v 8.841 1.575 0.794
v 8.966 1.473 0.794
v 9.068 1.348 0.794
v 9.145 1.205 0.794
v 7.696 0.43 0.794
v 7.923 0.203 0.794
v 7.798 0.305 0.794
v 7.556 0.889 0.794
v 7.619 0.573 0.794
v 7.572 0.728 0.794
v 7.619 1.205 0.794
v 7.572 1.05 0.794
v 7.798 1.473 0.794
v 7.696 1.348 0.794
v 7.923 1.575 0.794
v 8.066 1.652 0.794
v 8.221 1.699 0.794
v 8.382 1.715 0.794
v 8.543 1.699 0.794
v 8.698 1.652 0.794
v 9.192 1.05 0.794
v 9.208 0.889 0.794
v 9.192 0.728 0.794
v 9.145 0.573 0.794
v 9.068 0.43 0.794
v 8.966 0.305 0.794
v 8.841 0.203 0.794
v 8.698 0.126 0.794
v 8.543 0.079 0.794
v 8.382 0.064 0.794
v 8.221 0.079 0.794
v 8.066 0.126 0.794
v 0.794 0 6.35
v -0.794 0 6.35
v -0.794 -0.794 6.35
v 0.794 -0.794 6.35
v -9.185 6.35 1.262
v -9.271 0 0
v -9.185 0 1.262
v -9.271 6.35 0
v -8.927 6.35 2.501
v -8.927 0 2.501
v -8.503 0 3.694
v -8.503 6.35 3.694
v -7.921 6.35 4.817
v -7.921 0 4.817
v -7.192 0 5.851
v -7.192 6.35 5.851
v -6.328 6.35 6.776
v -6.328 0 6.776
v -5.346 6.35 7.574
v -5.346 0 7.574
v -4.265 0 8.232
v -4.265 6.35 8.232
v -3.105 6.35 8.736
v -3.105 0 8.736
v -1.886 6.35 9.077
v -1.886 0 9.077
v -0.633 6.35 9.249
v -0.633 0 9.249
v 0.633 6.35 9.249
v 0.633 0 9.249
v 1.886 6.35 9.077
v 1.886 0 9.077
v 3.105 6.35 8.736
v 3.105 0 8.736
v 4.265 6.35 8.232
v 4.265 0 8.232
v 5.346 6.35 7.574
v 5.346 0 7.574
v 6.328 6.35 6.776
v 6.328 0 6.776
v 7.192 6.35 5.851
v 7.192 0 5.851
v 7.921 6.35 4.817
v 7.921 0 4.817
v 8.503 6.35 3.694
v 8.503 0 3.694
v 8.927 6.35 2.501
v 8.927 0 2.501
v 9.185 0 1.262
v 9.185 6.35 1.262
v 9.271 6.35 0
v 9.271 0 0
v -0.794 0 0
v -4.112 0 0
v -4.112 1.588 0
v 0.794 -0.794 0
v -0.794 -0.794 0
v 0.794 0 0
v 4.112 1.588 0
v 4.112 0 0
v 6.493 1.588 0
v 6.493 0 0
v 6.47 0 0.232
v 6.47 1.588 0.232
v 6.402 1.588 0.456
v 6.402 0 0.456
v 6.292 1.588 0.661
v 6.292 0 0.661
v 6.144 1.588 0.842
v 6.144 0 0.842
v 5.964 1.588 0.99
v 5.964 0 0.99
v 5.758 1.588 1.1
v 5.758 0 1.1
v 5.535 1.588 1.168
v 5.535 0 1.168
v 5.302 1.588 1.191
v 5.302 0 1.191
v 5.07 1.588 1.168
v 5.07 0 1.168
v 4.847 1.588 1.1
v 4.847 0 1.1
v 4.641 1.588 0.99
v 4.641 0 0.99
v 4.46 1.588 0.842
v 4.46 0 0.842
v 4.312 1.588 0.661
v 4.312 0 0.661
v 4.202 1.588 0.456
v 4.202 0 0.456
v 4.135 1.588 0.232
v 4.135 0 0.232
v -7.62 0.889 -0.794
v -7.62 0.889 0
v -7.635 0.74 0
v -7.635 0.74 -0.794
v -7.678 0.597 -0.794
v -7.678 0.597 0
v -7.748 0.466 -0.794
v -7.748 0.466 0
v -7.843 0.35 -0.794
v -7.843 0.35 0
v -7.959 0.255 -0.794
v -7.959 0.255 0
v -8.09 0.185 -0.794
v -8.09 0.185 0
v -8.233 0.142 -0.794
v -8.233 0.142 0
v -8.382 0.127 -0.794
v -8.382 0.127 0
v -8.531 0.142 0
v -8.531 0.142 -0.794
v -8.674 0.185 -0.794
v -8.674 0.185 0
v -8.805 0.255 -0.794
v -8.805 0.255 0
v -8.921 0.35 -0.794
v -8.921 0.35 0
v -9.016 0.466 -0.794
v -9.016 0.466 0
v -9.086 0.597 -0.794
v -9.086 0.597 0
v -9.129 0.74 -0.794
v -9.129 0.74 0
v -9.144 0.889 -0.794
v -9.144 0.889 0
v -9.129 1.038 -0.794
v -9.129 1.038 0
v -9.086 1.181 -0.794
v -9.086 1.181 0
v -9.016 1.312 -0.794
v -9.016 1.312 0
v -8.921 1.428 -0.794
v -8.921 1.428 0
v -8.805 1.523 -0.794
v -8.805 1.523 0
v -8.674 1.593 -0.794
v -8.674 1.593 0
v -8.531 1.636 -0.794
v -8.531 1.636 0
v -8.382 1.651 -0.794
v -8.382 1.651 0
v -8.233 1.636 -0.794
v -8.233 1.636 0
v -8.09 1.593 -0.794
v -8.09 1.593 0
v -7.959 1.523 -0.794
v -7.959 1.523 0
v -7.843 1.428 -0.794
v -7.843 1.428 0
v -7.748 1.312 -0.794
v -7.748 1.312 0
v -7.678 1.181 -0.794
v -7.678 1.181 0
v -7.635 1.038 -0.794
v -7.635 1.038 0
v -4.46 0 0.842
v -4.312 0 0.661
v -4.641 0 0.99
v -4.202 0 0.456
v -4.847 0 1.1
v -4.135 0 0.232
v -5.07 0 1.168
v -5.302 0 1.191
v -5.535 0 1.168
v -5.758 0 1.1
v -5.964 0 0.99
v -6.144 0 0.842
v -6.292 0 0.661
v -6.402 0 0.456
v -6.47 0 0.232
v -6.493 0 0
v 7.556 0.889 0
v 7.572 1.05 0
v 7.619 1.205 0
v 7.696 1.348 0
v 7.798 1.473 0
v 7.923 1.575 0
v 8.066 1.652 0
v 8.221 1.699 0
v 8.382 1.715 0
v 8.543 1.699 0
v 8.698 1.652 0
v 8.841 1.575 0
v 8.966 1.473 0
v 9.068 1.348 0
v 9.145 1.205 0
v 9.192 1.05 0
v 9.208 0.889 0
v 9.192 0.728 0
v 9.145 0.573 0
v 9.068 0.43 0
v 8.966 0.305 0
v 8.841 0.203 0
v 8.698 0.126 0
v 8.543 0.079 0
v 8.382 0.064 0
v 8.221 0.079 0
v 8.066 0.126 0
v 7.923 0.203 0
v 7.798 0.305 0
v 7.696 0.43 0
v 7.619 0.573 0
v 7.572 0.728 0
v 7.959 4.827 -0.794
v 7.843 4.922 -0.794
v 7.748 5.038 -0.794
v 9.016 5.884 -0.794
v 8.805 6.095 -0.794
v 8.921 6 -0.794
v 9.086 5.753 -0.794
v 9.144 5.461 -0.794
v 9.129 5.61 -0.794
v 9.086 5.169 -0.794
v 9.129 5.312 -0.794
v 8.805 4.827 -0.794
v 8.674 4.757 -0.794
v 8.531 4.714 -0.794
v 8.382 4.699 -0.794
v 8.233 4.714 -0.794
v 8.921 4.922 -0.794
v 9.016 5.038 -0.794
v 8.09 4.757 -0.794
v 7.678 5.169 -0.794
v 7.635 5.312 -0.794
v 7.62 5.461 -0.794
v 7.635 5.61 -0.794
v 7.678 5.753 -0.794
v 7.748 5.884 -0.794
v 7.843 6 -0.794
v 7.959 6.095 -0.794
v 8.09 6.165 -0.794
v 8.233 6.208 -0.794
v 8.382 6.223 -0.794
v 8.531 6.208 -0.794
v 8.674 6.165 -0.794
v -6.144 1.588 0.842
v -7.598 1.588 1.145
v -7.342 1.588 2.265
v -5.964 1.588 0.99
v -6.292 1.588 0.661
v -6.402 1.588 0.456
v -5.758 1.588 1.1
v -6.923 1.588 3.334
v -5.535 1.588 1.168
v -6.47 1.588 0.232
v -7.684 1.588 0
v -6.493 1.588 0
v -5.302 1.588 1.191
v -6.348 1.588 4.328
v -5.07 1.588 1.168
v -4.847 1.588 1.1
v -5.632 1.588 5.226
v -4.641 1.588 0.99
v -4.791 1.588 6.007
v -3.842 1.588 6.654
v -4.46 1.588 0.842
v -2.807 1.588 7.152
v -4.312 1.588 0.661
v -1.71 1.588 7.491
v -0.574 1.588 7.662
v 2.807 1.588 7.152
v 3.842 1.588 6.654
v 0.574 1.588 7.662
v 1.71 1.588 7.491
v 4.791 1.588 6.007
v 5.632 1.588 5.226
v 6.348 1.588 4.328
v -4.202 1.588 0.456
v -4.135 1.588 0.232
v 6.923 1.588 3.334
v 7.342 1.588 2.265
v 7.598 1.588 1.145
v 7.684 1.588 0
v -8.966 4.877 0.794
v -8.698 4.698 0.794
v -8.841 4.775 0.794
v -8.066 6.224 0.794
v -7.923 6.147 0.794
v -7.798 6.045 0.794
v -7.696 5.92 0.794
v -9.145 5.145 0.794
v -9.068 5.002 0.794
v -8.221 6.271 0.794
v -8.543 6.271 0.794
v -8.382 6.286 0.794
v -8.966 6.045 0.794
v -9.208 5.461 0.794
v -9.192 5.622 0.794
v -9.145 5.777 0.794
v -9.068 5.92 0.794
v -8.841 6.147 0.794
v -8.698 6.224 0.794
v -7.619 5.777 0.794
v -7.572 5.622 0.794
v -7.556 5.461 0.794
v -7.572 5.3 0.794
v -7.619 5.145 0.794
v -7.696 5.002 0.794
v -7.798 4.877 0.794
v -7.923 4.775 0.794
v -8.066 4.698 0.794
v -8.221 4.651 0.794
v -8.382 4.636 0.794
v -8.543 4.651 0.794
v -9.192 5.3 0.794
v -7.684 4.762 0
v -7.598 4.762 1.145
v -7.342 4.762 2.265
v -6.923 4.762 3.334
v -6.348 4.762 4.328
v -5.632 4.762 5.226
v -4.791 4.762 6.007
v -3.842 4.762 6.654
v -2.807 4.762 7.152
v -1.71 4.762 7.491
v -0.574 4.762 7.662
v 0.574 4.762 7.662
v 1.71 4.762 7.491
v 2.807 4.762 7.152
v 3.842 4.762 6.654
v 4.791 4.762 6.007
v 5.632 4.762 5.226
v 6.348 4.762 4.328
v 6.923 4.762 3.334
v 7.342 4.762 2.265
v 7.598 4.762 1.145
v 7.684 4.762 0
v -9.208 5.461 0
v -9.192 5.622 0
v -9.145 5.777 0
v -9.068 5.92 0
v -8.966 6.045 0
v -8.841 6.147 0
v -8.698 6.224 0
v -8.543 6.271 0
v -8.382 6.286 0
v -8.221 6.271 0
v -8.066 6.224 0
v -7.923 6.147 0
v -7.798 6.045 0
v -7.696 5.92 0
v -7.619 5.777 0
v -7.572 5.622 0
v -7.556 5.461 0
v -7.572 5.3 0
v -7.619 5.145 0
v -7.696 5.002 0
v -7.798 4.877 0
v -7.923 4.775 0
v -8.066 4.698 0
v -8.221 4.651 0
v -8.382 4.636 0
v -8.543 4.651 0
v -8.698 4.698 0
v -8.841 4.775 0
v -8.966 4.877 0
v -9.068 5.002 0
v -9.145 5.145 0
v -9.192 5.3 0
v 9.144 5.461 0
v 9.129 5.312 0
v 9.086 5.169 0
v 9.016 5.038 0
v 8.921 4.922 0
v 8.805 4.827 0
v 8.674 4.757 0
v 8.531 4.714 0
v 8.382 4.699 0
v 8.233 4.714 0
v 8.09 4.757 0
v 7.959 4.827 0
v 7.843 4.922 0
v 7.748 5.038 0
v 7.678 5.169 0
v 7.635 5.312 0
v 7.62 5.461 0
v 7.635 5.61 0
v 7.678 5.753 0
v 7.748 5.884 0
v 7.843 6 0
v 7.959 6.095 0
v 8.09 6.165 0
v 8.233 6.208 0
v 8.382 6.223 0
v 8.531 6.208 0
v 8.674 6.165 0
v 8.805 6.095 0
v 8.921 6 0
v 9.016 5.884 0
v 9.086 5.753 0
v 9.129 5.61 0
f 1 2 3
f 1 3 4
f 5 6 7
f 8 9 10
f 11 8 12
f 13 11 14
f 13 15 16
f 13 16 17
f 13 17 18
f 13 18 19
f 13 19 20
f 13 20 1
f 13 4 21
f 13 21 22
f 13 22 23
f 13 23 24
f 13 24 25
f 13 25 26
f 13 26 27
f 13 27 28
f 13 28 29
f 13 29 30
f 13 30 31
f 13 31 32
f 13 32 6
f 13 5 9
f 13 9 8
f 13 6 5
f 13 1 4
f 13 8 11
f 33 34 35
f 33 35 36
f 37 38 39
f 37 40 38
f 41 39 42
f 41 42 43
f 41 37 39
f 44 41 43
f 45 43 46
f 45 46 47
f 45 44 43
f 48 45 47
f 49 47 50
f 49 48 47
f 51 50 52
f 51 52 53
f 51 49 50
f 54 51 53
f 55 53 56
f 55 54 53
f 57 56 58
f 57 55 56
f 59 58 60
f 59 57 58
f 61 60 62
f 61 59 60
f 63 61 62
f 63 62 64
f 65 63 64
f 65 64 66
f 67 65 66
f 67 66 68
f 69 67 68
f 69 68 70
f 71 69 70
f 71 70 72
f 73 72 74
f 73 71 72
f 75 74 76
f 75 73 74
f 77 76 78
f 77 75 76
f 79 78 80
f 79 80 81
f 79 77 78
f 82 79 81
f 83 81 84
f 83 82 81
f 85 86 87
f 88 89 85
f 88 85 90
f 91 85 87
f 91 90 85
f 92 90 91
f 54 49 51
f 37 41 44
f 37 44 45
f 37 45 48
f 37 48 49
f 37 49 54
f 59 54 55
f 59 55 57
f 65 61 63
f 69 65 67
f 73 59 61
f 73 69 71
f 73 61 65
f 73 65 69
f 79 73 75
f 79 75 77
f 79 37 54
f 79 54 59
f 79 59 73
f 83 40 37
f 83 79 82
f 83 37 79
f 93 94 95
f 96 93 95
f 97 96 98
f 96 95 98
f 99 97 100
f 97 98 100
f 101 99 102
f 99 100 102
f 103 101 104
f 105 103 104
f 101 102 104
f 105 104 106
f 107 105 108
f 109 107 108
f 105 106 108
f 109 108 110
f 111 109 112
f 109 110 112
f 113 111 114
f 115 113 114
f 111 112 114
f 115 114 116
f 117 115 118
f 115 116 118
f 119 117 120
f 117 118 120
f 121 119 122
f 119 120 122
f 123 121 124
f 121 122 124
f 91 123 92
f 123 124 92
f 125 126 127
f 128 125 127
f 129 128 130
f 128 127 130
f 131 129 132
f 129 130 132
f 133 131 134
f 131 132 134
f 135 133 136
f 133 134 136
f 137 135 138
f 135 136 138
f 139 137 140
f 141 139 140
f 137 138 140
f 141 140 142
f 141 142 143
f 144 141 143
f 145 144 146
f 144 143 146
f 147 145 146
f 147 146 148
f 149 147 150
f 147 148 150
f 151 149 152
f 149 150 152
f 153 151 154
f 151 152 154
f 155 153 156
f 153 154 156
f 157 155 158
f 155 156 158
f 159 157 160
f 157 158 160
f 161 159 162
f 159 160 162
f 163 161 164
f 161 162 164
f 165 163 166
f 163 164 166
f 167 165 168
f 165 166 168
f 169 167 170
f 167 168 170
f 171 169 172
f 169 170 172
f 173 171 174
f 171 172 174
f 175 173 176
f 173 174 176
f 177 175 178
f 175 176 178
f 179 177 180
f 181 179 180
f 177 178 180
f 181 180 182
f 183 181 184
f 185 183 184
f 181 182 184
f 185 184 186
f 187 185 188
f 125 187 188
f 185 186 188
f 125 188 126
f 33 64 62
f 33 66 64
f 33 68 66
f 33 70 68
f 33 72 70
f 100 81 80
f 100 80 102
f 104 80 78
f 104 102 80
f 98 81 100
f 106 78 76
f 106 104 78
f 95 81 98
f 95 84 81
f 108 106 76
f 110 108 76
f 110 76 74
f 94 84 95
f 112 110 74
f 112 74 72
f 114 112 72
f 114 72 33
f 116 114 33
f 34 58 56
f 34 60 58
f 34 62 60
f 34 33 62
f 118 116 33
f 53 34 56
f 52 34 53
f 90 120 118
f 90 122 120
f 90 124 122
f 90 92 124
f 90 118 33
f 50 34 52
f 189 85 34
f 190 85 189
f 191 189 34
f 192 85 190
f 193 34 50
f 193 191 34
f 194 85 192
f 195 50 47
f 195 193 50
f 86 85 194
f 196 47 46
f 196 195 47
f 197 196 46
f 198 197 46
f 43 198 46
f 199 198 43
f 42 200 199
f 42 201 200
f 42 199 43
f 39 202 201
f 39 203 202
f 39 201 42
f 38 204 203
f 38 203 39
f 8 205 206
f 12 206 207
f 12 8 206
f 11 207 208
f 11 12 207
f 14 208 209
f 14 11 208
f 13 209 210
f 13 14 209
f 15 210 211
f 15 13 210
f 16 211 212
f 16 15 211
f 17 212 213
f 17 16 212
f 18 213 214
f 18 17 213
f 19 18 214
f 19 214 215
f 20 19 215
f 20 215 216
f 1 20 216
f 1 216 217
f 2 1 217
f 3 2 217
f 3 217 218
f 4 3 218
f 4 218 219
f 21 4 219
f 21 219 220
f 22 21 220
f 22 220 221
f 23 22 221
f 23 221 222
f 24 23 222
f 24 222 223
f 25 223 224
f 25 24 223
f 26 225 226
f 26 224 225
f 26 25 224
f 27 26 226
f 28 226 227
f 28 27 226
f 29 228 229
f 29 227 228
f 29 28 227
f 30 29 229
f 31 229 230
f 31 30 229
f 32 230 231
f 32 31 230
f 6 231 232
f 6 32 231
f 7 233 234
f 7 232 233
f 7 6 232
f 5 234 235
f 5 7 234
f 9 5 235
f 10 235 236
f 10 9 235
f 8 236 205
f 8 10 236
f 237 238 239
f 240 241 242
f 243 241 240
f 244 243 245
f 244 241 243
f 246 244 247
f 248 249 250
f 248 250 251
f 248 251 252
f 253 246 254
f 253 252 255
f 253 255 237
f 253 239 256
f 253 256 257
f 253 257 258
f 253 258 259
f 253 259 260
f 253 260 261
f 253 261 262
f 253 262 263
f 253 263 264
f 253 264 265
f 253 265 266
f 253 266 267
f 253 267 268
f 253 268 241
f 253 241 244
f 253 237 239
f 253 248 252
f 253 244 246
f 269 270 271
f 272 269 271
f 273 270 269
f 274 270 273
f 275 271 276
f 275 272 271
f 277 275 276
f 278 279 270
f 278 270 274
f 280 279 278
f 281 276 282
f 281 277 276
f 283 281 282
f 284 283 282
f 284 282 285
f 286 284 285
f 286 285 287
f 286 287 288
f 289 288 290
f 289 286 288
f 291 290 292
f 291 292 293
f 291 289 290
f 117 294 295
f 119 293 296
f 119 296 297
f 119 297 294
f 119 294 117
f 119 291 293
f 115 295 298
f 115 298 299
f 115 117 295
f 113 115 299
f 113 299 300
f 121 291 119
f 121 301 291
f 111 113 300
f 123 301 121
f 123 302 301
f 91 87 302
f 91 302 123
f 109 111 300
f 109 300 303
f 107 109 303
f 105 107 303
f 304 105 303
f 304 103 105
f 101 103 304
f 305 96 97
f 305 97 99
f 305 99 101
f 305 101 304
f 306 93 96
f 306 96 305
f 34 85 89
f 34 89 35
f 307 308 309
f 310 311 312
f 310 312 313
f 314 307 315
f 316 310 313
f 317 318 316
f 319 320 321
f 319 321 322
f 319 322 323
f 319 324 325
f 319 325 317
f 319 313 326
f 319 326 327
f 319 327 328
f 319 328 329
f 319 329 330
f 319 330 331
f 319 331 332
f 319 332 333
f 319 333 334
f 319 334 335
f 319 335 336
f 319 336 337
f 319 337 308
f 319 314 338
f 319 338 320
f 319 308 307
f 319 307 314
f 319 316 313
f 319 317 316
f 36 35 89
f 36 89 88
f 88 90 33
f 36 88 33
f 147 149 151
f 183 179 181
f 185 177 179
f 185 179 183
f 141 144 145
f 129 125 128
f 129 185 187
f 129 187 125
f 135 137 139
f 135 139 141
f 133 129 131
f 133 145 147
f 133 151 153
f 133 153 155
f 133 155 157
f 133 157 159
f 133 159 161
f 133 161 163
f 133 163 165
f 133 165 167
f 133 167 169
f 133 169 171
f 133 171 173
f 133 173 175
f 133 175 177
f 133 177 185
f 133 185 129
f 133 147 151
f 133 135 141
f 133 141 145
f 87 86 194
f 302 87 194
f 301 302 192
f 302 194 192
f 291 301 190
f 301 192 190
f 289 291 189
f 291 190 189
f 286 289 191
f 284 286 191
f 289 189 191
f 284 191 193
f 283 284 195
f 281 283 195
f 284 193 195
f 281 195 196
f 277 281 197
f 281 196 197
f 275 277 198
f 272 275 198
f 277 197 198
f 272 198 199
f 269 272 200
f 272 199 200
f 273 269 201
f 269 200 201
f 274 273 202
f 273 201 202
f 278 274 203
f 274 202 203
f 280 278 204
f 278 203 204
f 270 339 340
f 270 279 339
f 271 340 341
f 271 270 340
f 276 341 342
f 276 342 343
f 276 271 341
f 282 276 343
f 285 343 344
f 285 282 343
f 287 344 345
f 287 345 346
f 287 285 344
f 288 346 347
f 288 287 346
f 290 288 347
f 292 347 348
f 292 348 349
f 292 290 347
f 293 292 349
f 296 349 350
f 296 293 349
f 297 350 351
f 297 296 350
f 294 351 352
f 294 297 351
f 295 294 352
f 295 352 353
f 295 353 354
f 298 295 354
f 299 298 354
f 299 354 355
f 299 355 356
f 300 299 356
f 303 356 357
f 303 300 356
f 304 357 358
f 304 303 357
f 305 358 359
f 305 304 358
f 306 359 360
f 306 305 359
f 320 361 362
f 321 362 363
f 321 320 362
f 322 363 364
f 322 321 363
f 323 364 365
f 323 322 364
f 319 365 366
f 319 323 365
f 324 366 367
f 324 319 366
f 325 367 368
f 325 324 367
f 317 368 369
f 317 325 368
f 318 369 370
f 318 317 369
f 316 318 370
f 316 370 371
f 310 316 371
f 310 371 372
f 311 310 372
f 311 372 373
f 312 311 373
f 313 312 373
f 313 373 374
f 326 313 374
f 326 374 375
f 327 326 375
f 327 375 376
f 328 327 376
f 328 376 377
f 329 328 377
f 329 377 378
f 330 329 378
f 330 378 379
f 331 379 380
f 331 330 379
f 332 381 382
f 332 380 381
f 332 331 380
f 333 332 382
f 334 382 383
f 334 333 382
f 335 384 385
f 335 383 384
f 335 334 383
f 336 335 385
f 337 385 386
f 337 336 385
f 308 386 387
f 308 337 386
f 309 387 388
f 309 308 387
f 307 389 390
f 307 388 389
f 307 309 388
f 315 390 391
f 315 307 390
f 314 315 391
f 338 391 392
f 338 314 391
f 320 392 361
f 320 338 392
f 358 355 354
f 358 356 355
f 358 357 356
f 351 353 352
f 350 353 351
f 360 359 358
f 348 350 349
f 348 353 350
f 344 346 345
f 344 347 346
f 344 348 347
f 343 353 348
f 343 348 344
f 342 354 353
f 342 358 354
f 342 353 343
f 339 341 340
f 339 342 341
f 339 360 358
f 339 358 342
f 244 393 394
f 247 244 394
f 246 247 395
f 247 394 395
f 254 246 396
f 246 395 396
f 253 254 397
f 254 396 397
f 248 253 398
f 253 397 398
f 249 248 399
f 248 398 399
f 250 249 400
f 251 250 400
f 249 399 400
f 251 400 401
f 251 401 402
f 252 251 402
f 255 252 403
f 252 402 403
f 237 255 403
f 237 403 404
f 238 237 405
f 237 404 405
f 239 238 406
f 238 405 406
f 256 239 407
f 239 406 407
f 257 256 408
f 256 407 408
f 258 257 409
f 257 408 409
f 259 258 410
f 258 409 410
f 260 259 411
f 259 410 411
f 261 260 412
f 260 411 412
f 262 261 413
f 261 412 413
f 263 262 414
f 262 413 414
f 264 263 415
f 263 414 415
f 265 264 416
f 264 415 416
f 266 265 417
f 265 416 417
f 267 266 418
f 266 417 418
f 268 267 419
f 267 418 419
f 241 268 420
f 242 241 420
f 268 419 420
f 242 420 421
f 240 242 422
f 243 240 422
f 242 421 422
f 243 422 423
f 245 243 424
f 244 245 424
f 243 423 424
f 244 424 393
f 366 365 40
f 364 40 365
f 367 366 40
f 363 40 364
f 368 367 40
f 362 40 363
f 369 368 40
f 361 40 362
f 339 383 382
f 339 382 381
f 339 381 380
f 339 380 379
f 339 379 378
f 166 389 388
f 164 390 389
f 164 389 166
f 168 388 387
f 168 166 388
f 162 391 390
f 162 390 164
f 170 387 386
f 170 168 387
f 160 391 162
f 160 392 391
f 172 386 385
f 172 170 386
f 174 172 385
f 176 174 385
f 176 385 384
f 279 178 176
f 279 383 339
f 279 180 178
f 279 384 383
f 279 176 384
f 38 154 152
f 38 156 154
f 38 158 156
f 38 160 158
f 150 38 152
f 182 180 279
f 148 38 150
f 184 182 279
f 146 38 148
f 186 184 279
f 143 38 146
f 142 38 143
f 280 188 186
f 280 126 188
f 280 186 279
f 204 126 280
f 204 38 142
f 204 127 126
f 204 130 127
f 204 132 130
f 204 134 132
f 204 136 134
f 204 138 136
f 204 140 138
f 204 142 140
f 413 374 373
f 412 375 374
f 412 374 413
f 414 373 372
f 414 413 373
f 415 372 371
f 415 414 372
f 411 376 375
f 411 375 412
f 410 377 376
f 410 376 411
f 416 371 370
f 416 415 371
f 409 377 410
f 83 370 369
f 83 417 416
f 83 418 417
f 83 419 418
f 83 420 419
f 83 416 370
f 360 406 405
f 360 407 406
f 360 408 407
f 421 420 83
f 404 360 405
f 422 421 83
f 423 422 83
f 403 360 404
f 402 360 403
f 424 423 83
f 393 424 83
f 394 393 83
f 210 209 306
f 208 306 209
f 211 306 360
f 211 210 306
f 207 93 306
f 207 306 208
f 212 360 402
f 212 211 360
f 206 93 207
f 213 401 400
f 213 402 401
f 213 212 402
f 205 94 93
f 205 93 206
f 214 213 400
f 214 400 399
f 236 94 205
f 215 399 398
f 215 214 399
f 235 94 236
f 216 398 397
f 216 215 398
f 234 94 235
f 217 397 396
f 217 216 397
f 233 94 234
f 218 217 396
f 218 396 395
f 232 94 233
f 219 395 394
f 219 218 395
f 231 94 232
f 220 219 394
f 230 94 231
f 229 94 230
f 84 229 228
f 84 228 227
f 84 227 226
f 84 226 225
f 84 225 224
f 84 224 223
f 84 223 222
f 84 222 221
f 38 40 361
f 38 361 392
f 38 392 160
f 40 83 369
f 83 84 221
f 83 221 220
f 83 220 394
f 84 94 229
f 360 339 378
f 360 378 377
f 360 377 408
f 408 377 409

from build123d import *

# Parameters (mm, degrees)
SKETCH2_W           = 19.314156379
SKETCH2_H           = 10.14409312
CUT_EXTRUDE1_DEPTH  = 9.398
SKETCH3_R           = 1.190625
CUT_EXTRUDE2_DEPTH  = 3.048
SKETCH4_R           = 0.762
SKETCH4_R_2         = 0.8255
BOSS_EXTRUDE1_DEPTH = 0.79375
CUT_EXTRUDE3_START  = -1.5875
SKETCH6_R           = 0.8255
CUT_EXTRUDE3_DEPTH  = 1.5875
SKETCH7_W           = 1.5875
SKETCH7_H           = 6.35
BOSS_EXTRUDE2_DEPTH = 0.79375


with BuildPart() as part:
    # Sketch1 → Revolve1 (revolve)
    with BuildSketch(Plane.XY):
        Polygon((0, 1.5875), (0, 0), (9.271, 0), (9.271, 6.35), (0, 6.35), (0, 4.7625), (7.6835, 4.7625), (7.6835, 1.5875), align=None)
    revolve(axis=Axis((0, 0, 0), (0, 1, 0)))

    # Sketch2 → Cut-Extrude1 (cut)
    with BuildSketch(Plane(origin=(0, 6.35, 0), x_dir=(1, 0, 0), z_dir=(0, 1, 0))):
        with Locations((0.38607819, 5.07204656)):
            Rectangle(SKETCH2_W, SKETCH2_H)
    extrude(amount=-CUT_EXTRUDE1_DEPTH, mode=Mode.SUBTRACT)

    # Sketch3 → Cut-Extrude2 (cut)
    with BuildSketch(Plane.XZ):
        with Locations((5.30225, 0)):
            Circle(SKETCH3_R)
        with Locations((-5.30225, 0)):
            Circle(SKETCH3_R)
    extrude(amount=-CUT_EXTRUDE2_DEPTH, mode=Mode.SUBTRACT)

    # Sketch4 → Boss-Extrude1 (add)
    with BuildSketch(Plane(origin=(0, 0, 0), x_dir=(-1, 0, 0), z_dir=(0, 0, -1))):
        with Locations((-8.382, 5.461)):
            Circle(SKETCH4_R)
        with Locations((-8.382, 0.889)):
            Circle(SKETCH4_R_2)
        with Locations((8.382, 5.461)):
            Circle(SKETCH4_R_2)
        with Locations((8.382, 0.889)):
            Circle(SKETCH4_R)
    extrude(amount=BOSS_EXTRUDE1_DEPTH)

    # Sketch6 → Cut-Extrude3 (cut)
    with BuildSketch(Plane(origin=(0, 0, -0.79375), x_dir=(-1, 0, 0), z_dir=(0, 0, -1)).offset(CUT_EXTRUDE3_START)):
        with Locations((-8.382, 0.889)):
            Circle(SKETCH6_R)
        with Locations((8.382, 5.461)):
            Circle(SKETCH6_R)
    extrude(amount=CUT_EXTRUDE3_DEPTH, mode=Mode.SUBTRACT)

    # Sketch7 → Boss-Extrude2 (add)
    with BuildSketch(Plane.XZ):
        with Locations((0, 3.175)):
            Rectangle(SKETCH7_W, SKETCH7_H)
    extrude(amount=BOSS_EXTRUDE2_DEPTH)


solid = part.part
